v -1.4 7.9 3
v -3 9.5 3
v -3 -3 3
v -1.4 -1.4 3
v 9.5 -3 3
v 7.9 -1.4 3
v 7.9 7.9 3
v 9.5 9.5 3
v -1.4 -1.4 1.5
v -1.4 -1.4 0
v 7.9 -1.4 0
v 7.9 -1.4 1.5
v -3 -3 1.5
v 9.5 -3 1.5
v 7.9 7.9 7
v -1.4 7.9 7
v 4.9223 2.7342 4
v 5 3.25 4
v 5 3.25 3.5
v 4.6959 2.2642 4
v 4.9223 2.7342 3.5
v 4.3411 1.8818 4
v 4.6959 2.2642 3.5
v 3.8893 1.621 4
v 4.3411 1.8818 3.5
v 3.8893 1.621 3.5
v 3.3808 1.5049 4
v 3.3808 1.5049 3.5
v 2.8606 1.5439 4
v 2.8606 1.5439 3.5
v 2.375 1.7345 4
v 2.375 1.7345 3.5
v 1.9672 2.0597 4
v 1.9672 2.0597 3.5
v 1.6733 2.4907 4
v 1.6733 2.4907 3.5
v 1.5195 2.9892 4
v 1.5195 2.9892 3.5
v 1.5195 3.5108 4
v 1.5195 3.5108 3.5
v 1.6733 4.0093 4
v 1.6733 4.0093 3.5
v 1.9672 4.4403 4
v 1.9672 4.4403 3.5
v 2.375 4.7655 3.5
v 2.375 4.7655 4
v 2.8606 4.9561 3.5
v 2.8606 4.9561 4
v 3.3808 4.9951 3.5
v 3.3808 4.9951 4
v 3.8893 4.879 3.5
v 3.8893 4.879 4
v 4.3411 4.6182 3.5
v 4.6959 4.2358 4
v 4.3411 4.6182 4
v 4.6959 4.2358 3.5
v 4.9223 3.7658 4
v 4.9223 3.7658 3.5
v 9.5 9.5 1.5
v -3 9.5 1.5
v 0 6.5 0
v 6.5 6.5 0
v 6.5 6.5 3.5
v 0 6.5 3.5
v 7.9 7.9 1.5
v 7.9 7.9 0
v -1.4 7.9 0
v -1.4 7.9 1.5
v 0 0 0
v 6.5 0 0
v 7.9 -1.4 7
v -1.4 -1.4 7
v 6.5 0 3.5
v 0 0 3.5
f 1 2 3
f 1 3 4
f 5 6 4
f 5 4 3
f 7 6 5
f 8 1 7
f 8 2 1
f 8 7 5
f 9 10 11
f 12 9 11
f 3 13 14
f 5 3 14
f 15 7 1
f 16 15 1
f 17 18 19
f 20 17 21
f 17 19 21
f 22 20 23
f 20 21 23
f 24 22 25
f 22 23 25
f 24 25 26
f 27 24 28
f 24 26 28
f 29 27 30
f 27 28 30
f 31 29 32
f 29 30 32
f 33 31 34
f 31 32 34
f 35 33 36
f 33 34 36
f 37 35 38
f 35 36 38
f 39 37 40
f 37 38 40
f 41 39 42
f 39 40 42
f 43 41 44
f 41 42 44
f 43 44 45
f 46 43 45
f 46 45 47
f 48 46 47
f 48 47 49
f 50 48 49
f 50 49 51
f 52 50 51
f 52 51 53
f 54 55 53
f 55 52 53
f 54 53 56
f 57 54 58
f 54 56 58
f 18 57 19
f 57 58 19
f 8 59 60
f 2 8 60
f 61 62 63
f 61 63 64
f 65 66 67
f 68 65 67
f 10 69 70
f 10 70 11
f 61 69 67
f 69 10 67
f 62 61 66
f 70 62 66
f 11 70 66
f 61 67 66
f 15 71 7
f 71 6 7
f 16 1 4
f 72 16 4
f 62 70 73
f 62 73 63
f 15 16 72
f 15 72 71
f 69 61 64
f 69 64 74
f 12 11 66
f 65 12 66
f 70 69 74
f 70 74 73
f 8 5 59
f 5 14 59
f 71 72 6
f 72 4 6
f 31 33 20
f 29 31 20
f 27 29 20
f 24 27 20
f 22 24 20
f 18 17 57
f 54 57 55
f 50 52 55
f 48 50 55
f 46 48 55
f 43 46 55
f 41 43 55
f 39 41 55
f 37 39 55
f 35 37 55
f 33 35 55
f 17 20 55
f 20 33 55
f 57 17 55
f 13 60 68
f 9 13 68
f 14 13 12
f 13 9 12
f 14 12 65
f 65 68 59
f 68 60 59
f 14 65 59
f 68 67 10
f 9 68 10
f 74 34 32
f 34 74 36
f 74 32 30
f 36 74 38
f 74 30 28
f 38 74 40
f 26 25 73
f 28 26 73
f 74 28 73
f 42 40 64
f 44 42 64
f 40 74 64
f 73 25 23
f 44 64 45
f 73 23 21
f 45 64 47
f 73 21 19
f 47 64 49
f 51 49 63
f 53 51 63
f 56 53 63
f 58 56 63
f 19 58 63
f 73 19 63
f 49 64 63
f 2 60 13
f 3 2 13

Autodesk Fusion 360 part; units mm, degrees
sketch "Sketch1" plane through (0, 0, 0) normal (0, 0, 1) x (1, 0, 0)
  line L0 (0, 0) -> (6.5, 0)
  line L1 (6.5, 0) -> (6.5, 6.5)
  line L2 (6.5, 6.5) -> (0, 6.5)
  line L3 (0, 6.5) -> (0, 0)
  line L4 (0, 3.25) -> (6.5, 3.25) construction
  line L5 (3.25, 6.5) -> (3.25, 0) construction
  circle A0 centre (3.25, 3.25) radius 1.75
  line L6 (-1.4, 7.9) -> (-1.4, -1.4)
  line L7 (-1.4, -1.4) -> (7.9, -1.4)
  line L8 (7.9, -1.4) -> (7.9, 7.9)
  line L9 (7.9, 7.9) -> (-1.4, 7.9)
  line L10 (-3, 9.5) -> (-3, -3)
  line L11 (-3, -3) -> (9.5, -3)
  line L12 (9.5, -3) -> (9.5, 9.5)
  line L13 (9.5, 9.5) -> (-3, 9.5)
  dimension "d1" = 6.5
  dimension "d2" = 6.5
  dimension "d3" = 3.5
  dimension "d4" = 1.4
  dimension "d5" = 3
extrude "Extrude1" add sketch "Sketch1" along normal blind 7 contours L6 L7 L8 L9
extrude "Extrude2" add sketch "Sketch1" along normal blind 1.5 from surface at 1.5 contours L10 L11 L12 L13
extrude "Extrude3" add sketch "Sketch1" along normal blind 3.5 from surface at 3.5 contours L0 L1 L2 L3 | A0
extrude "Extrude4" cut sketch "Sketch1" along normal blind 4 contours A0
